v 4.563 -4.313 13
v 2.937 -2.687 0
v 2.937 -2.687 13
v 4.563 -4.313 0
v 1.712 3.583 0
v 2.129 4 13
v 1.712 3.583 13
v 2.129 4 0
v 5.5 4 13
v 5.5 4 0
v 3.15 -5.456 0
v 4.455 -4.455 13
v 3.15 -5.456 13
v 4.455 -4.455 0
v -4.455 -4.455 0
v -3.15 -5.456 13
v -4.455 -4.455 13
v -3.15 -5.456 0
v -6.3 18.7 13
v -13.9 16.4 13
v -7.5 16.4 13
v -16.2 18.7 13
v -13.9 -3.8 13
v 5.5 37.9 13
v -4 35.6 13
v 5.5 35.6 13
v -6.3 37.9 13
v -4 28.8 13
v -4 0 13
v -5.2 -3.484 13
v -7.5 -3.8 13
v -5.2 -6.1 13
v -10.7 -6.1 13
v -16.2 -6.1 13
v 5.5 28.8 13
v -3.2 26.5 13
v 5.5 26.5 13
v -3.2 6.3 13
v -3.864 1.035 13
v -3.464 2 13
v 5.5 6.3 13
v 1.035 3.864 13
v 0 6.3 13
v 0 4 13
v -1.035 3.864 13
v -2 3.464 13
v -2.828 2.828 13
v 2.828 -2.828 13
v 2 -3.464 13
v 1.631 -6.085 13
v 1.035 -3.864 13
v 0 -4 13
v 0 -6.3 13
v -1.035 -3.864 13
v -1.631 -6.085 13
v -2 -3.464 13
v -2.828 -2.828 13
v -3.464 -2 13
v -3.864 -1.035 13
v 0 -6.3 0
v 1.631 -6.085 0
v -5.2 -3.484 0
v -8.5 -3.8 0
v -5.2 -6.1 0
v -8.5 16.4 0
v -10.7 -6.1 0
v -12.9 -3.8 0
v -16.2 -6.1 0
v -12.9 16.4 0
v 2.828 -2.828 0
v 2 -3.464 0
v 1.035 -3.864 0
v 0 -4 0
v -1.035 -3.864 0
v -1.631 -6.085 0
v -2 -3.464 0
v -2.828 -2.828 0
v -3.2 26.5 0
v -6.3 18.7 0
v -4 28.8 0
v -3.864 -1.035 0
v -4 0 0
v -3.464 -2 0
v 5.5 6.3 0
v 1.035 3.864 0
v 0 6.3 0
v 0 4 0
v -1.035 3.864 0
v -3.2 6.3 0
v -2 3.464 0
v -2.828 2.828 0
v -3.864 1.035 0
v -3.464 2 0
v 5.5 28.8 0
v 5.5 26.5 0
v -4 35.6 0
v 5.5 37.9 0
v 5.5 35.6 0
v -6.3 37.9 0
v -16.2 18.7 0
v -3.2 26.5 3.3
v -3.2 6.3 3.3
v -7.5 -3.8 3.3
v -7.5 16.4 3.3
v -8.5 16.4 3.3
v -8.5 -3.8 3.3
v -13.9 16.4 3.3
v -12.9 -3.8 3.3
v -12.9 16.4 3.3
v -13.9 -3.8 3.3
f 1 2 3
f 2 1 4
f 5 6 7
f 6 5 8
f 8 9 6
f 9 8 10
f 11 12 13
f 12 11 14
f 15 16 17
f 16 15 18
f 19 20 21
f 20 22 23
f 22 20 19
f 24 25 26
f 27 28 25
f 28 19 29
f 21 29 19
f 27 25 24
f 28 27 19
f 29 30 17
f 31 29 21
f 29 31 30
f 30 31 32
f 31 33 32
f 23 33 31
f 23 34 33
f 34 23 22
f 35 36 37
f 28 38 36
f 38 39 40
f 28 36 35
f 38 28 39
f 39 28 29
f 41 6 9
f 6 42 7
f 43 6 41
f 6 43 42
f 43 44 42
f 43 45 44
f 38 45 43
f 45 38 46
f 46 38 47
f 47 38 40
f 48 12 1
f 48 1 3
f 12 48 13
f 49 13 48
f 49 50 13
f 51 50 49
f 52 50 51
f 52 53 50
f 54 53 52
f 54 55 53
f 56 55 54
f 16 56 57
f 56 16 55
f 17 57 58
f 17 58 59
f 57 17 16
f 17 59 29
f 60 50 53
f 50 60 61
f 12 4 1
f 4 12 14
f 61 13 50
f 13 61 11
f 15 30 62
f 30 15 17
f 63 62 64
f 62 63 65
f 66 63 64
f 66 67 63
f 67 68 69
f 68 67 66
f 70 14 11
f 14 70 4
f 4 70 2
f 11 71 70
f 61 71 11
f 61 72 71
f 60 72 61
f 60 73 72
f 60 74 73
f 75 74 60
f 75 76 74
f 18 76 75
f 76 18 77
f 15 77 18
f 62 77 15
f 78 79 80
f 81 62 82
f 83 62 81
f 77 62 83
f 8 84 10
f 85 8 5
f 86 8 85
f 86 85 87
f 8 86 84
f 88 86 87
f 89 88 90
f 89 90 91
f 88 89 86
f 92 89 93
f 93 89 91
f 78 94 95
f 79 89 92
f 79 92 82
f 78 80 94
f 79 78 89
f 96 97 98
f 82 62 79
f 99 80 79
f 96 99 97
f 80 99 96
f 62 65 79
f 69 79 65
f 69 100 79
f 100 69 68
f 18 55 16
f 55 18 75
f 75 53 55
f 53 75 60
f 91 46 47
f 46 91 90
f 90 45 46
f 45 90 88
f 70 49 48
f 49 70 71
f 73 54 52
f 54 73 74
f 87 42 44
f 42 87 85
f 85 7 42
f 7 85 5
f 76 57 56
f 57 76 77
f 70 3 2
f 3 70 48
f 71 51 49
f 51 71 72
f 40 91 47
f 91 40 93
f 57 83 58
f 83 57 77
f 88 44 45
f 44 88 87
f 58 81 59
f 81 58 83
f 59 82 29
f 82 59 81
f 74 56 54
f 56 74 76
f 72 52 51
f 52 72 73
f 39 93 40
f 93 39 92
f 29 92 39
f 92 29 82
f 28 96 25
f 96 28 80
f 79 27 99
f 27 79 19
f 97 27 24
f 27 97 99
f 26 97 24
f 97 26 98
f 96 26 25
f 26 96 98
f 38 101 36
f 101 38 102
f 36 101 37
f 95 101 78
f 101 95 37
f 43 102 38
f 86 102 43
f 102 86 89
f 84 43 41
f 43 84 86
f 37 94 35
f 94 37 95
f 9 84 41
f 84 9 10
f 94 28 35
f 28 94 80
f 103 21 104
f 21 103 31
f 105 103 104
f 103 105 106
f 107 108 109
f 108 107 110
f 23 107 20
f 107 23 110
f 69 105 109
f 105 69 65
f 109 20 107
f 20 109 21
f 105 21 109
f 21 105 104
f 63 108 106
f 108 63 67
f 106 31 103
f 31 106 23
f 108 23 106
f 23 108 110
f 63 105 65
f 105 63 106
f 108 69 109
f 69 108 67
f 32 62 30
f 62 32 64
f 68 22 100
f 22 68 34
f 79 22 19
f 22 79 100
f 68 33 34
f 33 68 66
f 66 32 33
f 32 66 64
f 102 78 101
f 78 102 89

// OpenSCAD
// file: parameters.scad
//
// common.scad
//

$fn = 24;

radius_3mm = 1.7;
radius_4mm = 2.2;
diam_8mm = 8;
radius_8mm = diam_8mm / 2;

// tunables

part_thickness = 2.3; // see how it slices

// stats about your i3
rod_frame_gap = 24.8;
frame_thickness = 6.8;

// distance between lower and upper y bars
y_bars_gap = 16;

// size of the endstop
endstop_w = 20 + 0.2;
endstop_h = 10.5 + 0.2;
endstop_d = 6 + 0.2 + 0.2;

// useful shorthand
pt2 = part_thickness / 2;
// file: common.scad
//
// common.scad
//

include <parameters.scad>

clip_h = endstop_h + part_thickness;
holder_d = endstop_d + part_thickness * 2;
holder_w = endstop_w + part_thickness * 2;

module endstop_holder() {
	difference() {
		translate([-holder_d / 2, radius_8mm, 0])
			cube([holder_d, holder_w, clip_h]);

		translate([-holder_d / 2, radius_8mm, 0]) {
			// cutout endstop hole
			translate([part_thickness, part_thickness, part_thickness + 1]) cube([endstop_d, endstop_w, endstop_h + 2]);

			// cutout endstop wire hole
			translate([part_thickness + 1, part_thickness, -0.5]) cube([endstop_d - 2, endstop_w, part_thickness + 2]);
		}
		// cutout the rod
		cylinder(r=radius_8mm, h=clip_h + 1);
	}
}

module screw(r=radius_3mm, length=10, cap=2, hex=false) {
	cylinder(r=r, h=length);
	translate([0, 0, length])
		difference() {
			cylinder(r1=r+1, r2=r + 0.8, h=cap);
			translate([0, 0, cap]) {
				if (hex) {
					cylinder(r=r, h=2, $fn=6, center=true);
				}
				else {
					rotate([0, 0, 45])
						cube([r * 2, r / 4, 2], center=true);
					rotate([0, 0, 135])
						cube([r * 2, r / 4, 2], center=true);
				}
			}
		}
}
// main file
//
// i3-z-endstop.scad
//

include <common.scad>

draw_assembled = false;

is_adjustable = false;
draw_adjuster = true;
draw_slider = true;
draw_holder = true;
jmmp = true;

adjuster_height = 8;
adjuster_dist = 2.5;
play_gap = adjuster_dist / 2;

min_adj_home = clip_h + adjuster_height + pt2 + play_gap / 2;

z_home_pos = min_adj_home + 10; // top of endstop. (min_adj_home = no extra mounting)

/**
 *	Draw the parts for printing or in the assembly
 */
if (draw_assembled) {
	i3_z_endstop(draw_adjuster=is_adjustable,draw_holder=is_adjustable,draw_slider=is_adjustable);
	rod_and_frame();
}
else {
	if (is_adjustable) assign(flip=(z_home_pos==min_adj_home)) {
		rotate(flip ? [0,180,180] : [0,0,0])
		translate(flip ? [0,0,-9.2] : [0,0,0])
			i3_z_endstop(draw_adjuster=draw_adjuster,draw_holder=false,draw_slider=false);
		i3_z_endstop(draw_adjuster=false,draw_holder=false,draw_slider=draw_slider);
		i3_z_endstop(draw_adjuster=false,draw_holder=draw_holder,draw_slider=false);
	}
	else {
		i3_z_endstop();
	}
}

module i3_z_endstop(draw_adjuster=false, draw_holder=true, draw_slider=false) {

	clip_r = radius_8mm + part_thickness;
	frame_clip_len = rod_frame_gap + frame_thickness + part_thickness + radius_8mm;

	adj_z = z_home_pos - clip_h - play_gap / 2;
	adj_box_hi = adjuster_height + part_thickness;
	adj_box_size = 10;
	adj_box_len = 16;
	adj_slide_len = adj_box_len - 5;
	adj_offset_y = -2.5;
	adj_box_bottom = pt2;
	adjuster_center = [-adj_box_size / 2 - pt2, adj_offset_y, (adj_z - adjuster_height) / 2 - pt2];
	slider_tab_r = 1.2;

	// Z Endstop Holder
	if (draw_holder)
	color([1,1,1])
	translate(draw_assembled ? [0,0,z_home_pos-clip_h] : is_adjustable ? [-5-adjuster_height,-frame_clip_len/2,clip_r] : [0,0,0])
	rotate(draw_assembled || !is_adjustable ? [0,0,0] : [0,-90,0])
	union() {

		// rod mount
		difference() {
			cylinder(r=clip_r, h=clip_h);
			translate([0,0,-0.1]) cylinder(r=radius_8mm, h=clip_h + 0.2);
			difference() {
				translate([5.2, 0, clip_h / 2]) rotate([0,0,45]) cube([7, 10, clip_h + 0.1], center=true);
				translate([5, (radius_8mm + 10) / 2, clip_h / 2]) cube([11, 6, clip_h + 0.1], center=true);
			}
			// color([0,0,0]) translate([10/2, radius_8mm / 2, clip_h / 2]) cube([10, radius_8mm, clip_h + 3], center=true);
		}

		// frame mount
		translate([-radius_8mm, 0, clip_h / 2]) {
			translate([-pt2, frame_clip_len / 2]) cube([part_thickness, frame_clip_len, clip_h], center=true);
			translate([6 / 2 + 1.5, frame_clip_len - pt2]) cube([10, part_thickness, clip_h], center=true);
		}

		// A Height Adjuster tab!
		if (is_adjustable) assign(tab_extra=1.5) {
			translate([-radius_8mm - pt2 + tab_extra / 2, radius_8mm + adj_offset_y + pt2 + 13.8, -adjuster_height/2]) {
				difference() {
					// Attach the tab to the holder
					cube([part_thickness + tab_extra, adj_box_len - 0.5, adjuster_height], center=true);
					// Make a hole for the slider
					hull() {
						for(v=[-1,1]) translate([0,v*adj_slide_len/2,-v*adjuster_dist/2]) rotate([0,90,0])
							cylinder(r=slider_tab_r+0.05, h=part_thickness + tab_extra + 0.1, center=true);
					}
				}
			}
		}

        if(jmmp)
        translate( [-endstop_h,-endstop_w/2,0] ) // JMMP
		endstop_holder();
        difference() {
				endstop_holder();
				translate([-3.2,6.3,-2])cube([endstop_h,endstop_w,40]);
			}
        //translate([-3.2,6.3,-2])color("red")cube([endstop_h,endstop_w,40]);
        
        if(!jmmp)
        endstop_holder();
	} // end: Z Endstop Holder

	// Z Endstop Adjuster
	if (draw_adjuster)
	translate(draw_assembled ? [0,0,0] : [2,-frame_clip_len/2,adj_z])
	rotate(draw_assembled ? [0,0,0] : [0,180,0])
	union() {

		// Adjuster rod clip
		color([1,0.8,0]) difference() {
			cylinder(r=clip_r, h=adj_z);
			translate([0,0,-0.1]) cylinder(r=radius_8mm, h=adj_z + 0.2);
			difference() {
				translate([5.2, 0, adj_z / 2]) rotate([0,0,45]) cube([7, 10, adj_z + 0.1], center=true);
				translate([5, (radius_8mm + 10) / 2, adj_z / 2]) cube([11, 6, adj_z + 0.1], center=true);
			}
			// color([0,0,0]) translate([10/2, radius_8mm / 2, adj_z / 2]) cube([10, radius_8mm, adj_z + 3], center=true);
		}

		// Adjuster outer wall
		translate([-radius_8mm - pt2, frame_clip_len / 2, adj_z / 2]) {
			color([1,0.8,0])
			difference() {
				union() {
					// front-to-back straight wall
					cube([part_thickness, frame_clip_len, adj_z], center=true);
					// Adjuster Box - holds the adjuster block
					translate(adjuster_center + [0,0,-adj_box_bottom / 2 + pt2])
						cube([adj_box_size+part_thickness, adj_box_len+part_thickness*2, adj_box_hi - part_thickness + adj_box_bottom], center=true);
				}

				// Cutout in the front-to-back wall
				if (z_home_pos>min_adj_home)
					assign(hi=adj_z-adj_box_hi)
						translate([0, -(frame_thickness+part_thickness*2)/2, -(adj_box_hi+0.1)/2])
							cube([part_thickness+0.1, frame_clip_len -(frame_thickness+part_thickness*2), hi+0.1], center=true);

				// gap for endstop adjuster tab
				translate(adjuster_center) {
					translate([pt2+pt2/2,0,part_thickness])
						cube([adj_box_size+pt2+0.2, adj_box_len, adj_box_hi + 0.1], center=true);
				}

				// front-to-back adjuster screw hole
				translate(adjuster_center + [pt2/2,0,pt2])
					rotate([90,0,0])
						cylinder(r=radius_3mm, h=adj_box_len+part_thickness*2+0.1, center=true);
			}
		}

		// Adjuster frame-clips
		color([1,0.8,0]) for (y=[0,-(frame_thickness+part_thickness)])
			translate([-radius_8mm + 6 / 2 + 1.5, frame_clip_len - pt2 + y, adj_z / 2])
				difference() {
					cube([10, part_thickness, adj_z], center=true);
					if (y == 0)
						translate([0,0,0])
							rotate([90,0,0])
								cylinder(r=radius_3mm-0.2, h=part_thickness+0.1, center=true);
				}

		if (draw_assembled)
			assign(len=adj_box_len+part_thickness*2, xtr=3)
			color([0.8,0.8,0.8])
			translate([-radius_8mm - pt2, frame_clip_len / 2, adj_z / 2] + adjuster_center + [pt2/2,len/2+xtr-0.1,pt2])
				rotate([90,0,0])
					screw(r=radius_3mm-0.1,length=len+xtr, hex=true);

	} // end: Z Endstop Adjuster

	// Adjuster slider
	if (draw_slider)
	assign(slider_width=adj_box_size-pt2-0.5)
	translate(draw_assembled ? [-radius_8mm - pt2, frame_clip_len / 2, adj_z / 2] + adjuster_center + [pt2/2,0,pt2] : [0,0,(adj_box_size-1.5)/2])
	rotate(draw_assembled ? [0,0,0] : [0,-90,0])
	{
		difference() {
			// main body of the adjuster slider
			cube([slider_width, adj_box_size, adjuster_height - 0.2], center=true);
			rotate([90,0,0]) {
				// screw hole
				cylinder(r=radius_3mm, h=adj_box_size+0.1, center=true);
				// nut trap hexagon with point down
				rotate([0,0,30]) cylinder(r=radius_3mm+1.6, h=2.25, center=true, $fn=6);
				// nut trap opening cube
				translate([0, adjuster_height / 2 / 2, 0])
					cube([radius_3mm+4, adjuster_height / 2 + 0.1, 2.25], center=true);
			}
		}
		translate([(slider_width+part_thickness+1.5) / 2,0,play_gap/2]) rotate([0,90,0]) {
			hull() for (v=[-1,1]) translate([v*adjuster_dist/4,v*adj_slide_len/4,0])
				cylinder(r=slider_tab_r, h=part_thickness+1.5+0.1, center=true);
		}
	}

}

module rod_and_frame() {
	color([0.8,0.8,0.8]) translate([0,0,-40]) cylinder(r=radius_8mm, h=240);
	color([0.9,0.9,0.9]) translate([-radius_8mm, rod_frame_gap + radius_8mm, -40]) cube([40, frame_thickness, 240]);
	color([0.95,0.95,0.8]) {
		translate([0,6.25,-5/2]) cube([15, 45, 5], center=true);
		translate([20,21.3,-5/2]) cube([45, 15, 5], center=true);
	}
}
